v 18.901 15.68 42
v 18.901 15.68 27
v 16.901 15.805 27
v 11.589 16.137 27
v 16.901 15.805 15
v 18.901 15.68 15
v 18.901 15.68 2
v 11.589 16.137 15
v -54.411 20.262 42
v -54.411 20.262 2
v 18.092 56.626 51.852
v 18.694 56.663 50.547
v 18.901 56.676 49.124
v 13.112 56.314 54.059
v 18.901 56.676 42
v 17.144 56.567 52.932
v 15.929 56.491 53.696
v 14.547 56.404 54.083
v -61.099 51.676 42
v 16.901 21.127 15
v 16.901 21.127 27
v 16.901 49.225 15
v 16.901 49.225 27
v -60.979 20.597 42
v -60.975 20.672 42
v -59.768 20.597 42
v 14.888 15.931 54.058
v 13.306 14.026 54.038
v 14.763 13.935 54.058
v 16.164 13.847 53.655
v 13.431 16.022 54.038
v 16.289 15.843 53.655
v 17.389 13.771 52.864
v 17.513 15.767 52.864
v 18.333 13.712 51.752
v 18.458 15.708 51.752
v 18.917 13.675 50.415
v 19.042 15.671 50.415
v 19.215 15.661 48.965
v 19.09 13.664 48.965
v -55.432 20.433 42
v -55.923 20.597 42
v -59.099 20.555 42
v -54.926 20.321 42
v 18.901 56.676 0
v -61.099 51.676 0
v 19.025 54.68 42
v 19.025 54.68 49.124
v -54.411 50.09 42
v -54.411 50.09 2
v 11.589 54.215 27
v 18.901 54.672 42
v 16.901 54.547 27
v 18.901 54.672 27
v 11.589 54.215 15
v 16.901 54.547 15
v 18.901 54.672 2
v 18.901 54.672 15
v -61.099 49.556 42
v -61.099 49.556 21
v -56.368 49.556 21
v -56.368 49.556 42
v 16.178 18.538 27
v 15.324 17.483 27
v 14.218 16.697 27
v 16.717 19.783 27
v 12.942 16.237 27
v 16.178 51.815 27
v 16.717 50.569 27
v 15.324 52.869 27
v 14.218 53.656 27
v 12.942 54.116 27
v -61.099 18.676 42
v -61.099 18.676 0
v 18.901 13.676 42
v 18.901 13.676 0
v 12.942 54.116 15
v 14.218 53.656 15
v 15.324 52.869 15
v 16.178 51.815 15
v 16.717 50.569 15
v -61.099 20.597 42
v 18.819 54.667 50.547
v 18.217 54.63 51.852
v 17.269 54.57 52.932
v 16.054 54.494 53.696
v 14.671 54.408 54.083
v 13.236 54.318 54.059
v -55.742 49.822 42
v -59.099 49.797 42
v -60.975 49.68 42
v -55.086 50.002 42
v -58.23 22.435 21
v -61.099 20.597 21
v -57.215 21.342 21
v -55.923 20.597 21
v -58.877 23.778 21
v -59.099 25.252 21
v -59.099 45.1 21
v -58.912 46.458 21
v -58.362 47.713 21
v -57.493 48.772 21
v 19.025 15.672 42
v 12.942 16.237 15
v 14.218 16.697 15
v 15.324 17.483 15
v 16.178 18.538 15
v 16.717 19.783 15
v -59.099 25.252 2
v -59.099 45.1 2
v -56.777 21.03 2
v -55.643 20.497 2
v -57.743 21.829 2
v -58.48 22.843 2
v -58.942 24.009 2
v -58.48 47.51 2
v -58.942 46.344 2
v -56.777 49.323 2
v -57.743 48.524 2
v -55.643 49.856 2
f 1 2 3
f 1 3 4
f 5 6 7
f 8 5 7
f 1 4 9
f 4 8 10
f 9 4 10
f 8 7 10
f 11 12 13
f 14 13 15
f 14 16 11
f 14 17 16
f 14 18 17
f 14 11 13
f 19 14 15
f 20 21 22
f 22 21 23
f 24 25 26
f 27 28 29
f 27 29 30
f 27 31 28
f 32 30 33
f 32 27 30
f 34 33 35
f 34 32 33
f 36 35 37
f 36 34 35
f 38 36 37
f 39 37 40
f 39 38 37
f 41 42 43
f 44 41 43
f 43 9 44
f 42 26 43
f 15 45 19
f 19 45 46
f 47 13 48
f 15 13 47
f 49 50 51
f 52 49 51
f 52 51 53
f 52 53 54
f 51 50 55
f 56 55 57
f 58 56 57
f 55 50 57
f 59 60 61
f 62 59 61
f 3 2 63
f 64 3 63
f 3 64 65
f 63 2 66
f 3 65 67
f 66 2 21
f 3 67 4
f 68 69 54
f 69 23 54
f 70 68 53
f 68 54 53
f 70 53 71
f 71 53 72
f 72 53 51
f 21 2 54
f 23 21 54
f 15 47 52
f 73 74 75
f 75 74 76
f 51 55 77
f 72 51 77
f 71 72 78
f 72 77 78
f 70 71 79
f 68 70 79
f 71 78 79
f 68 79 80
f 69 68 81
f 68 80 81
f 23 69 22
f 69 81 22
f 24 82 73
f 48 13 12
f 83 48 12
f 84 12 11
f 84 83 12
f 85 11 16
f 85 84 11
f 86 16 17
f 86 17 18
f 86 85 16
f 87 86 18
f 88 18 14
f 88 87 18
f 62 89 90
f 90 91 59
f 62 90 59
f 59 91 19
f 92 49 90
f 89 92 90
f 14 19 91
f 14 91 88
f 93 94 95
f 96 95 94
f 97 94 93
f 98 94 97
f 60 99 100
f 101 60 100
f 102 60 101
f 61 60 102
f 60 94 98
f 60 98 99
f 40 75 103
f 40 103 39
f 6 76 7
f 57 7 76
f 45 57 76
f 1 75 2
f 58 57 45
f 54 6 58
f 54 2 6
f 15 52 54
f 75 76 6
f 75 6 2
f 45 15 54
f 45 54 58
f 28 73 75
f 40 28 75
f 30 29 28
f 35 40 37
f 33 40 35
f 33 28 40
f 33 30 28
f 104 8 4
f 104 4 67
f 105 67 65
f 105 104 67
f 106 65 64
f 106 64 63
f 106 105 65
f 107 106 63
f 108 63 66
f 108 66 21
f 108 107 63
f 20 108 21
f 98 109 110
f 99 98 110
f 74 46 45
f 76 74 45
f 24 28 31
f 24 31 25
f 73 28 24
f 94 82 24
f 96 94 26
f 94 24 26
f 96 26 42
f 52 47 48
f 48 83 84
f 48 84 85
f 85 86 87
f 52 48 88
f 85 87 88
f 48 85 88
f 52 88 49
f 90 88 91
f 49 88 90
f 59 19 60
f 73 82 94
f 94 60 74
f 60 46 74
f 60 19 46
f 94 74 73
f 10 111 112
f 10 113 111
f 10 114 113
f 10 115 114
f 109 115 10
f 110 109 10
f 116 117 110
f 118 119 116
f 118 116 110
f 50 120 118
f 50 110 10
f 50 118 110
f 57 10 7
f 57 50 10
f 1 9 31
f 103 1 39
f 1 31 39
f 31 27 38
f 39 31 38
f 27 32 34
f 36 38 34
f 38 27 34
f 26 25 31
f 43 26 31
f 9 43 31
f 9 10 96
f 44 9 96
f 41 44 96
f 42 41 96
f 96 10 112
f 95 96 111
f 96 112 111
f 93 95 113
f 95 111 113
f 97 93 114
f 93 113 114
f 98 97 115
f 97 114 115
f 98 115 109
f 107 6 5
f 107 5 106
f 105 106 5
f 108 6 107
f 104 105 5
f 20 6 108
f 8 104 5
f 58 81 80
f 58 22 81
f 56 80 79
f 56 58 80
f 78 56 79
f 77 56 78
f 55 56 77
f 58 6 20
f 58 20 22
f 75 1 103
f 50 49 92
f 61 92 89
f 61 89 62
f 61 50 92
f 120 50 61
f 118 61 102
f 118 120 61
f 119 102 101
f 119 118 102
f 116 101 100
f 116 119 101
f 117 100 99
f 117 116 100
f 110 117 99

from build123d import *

# Parameters (mm, degrees)
F1_DEPTH      = 2
F2_DEPTH      = 42
F5_DEPTH      = 2
F7_DEPTH      = 2
F8_W          = 28.9586056024
F8_H          = 21
F9_DEPTH      = 25
F10_W         = 38.9921951145
F10_H         = 12
F11_DEPTH     = 2
F12_T1_DEPTH  = 12
F12_T6_DEPTH  = 51.7431402671
F12_T11_DEPTH = 51.7431402671
F12_T17_DEPTH = 40
F12_T22_DEPTH = 51.7431402671
F13_R         = 5


# Not quite as in the source:
# - a fillet or chamfer that OpenCascade refuses, or shapes differently, is made with other operations: its cross-section is extruded or revolved along the edge and cut away or added


with BuildPart() as f1:
    # F0 (on Top) → F1 (new body)
    with BuildSketch(Plane.XY):
        Polygon((16.9007111498, 56.5512960928), (-61.0992888502, 51.6762960928), (-61.0992888502, 18.6762960928), (16.9007111498, 13.8012960928), (18.9007111498, 13.6762960928), (18.9007111498, 15.6801985355), (16.9007111498, 15.8051985355), (-59.0992888502, 20.5551985355), (-59.0992888502, 49.79739365), (16.9007111498, 54.54739365), (18.9007111498, 54.67239365), (18.9007111498, 56.6762960928), align=None)
        Polygon((18.9007111498, 15.6801985355), (18.9007111498, 54.67239365), (16.9007111498, 54.54739365), (16.9007111498, 15.8051985355), align=None)
        Polygon((16.9007111498, 15.8051985355), (16.9007111498, 54.54739365), (-59.0992888502, 49.79739365), (-59.0992888502, 20.5551985355), align=None)
    extrude(amount=F1_DEPTH)

    # F0 (on Top) → F2 (join)
    with BuildSketch(Plane.XY):
        Polygon((16.9007111498, 56.5512960928), (-61.0992888502, 51.6762960928), (-61.0992888502, 18.6762960928), (16.9007111498, 13.8012960928), (18.9007111498, 13.6762960928), (18.9007111498, 15.6801985355), (16.9007111498, 15.8051985355), (-59.0992888502, 20.5551985355), (-59.0992888502, 49.79739365), (16.9007111498, 54.54739365), (18.9007111498, 54.67239365), (18.9007111498, 56.6762960928), align=None)
    extrude(amount=F2_DEPTH)

    # F3 (on face) → F5 (join)
    with BuildSketch(Plane(origin=(0.9249861815, 14.7997789033, 0), x_dir=(0.9980525785, -0.0623782862, 0), z_dir=(-0.0623782862, -0.9980525785, 0))):
        Polygon((18.3653086424, 55), (-62.1452981224, 42), (18.010799587, 42), align=None)
    extrude(amount=-F5_DEPTH)

    # F6 (on face) → F7 (join)
    with BuildSketch(Plane(origin=(-3.4549417367, 55.2790677874, 0), x_dir=(-0.9980525785, -0.0623782862, 0), z_dir=(-0.0623782862, 0.9980525785, 0))):
        Polygon((-22.3992737141, 55), (-22.3992737141, 42), (57.7568239953, 42), align=None)
    extrude(amount=-F7_DEPTH)

    # F8 (on face) → F9 (cut)
    with BuildSketch(Plane(origin=(-61.0992888502, 0, 0), x_dir=(0, -1, 0), z_dir=(-1, 0, 0))):
        with Locations((-35.0762708113, 31.5)):
            Rectangle(F8_W, F8_H)
    extrude(amount=-F9_DEPTH, mode=Mode.SUBTRACT)

    # F10 (on face) → F11 (join)
    with BuildSketch(Plane.YZ.offset(18.9007111498)):
        with Locations((35.1762960928, 21)):
            Rectangle(F10_W, F10_H)
    extrude(amount=-F11_DEPTH)

    # F12: fillet of radius 5 on 4 edges, made by hand

    # F12_s2 → F12_t1 (join)
    with BuildSketch(Plane.XY.offset(15)):
        with BuildLine():
            ThreePointArc((11.588819719, 16.1371917499), (15.324199345, 17.4833184516), (16.9007111498, 21.1274546423))
            Line((16.9007111498, 21.1274546423), (16.9007111498, 15.8051985355))
            Line((16.9007111498, 15.8051985355), (11.588819719, 16.1371917499))
        make_face()
        with BuildLine():
            ThreePointArc((11.588819719, 54.2154004356), (15.324199345, 52.869273734), (16.9007111498, 49.2251375432))
            Line((16.9007111498, 49.2251375432), (16.9007111498, 54.54739365))
            Line((16.9007111498, 54.54739365), (11.588819719, 54.2154004356))
        make_face()
    extrude(amount=F12_T1_DEPTH)


with BuildPart() as f12_tool4:
    # F12_s5 → F12_t6 (new body)
    with BuildSketch(Plane.XY.offset(2)):
        with BuildLine():
            ThreePointArc((-54.411180281, 20.2621917499), (-57.743425041, 21.8289664471), (-59.0992888502, 25.2524546423))
            Line((-59.0992888502, 25.2524546423), (-59.0992888502, 20.5551985355))
            Line((-59.0992888502, 20.5551985355), (-54.411180281, 20.2621917499))
        make_face()
    extrude(amount=F12_T6_DEPTH)

    split(bisect_by=Plane.XY.offset(21), keep=Keep.BOTTOM)


with BuildPart() as f1_1:
    add(f1.part)

    # F12_t3: union F12_tool4
    add(f12_tool4.part)


with BuildPart() as f12_tool9:
    # F12_s10 → F12_t11 (new body)
    with BuildSketch(Plane.XY.offset(-9.7431402671)):
        with BuildLine():
            ThreePointArc((-54.411180281, 20.2621917499), (-57.743425041, 21.8289664471), (-59.0992888502, 25.2524546423))
            Line((-59.0992888502, 25.2524546423), (-59.0992888502, 20.5551985355))
            Line((-59.0992888502, 20.5551985355), (-54.411180281, 20.2621917499))
        make_face()
    extrude(amount=F12_T11_DEPTH)

    split(bisect_by=Plane.XZ.offset(-20.5969680101), keep=Keep.TOP)

    split(bisect_by=Plane.XY.offset(21), keep=Keep.TOP)


with BuildPart() as f1_2:
    add(f1_1.part)

    # F12_t8: union F12_tool9
    add(f12_tool9.part)


with BuildPart() as f12_tool15:
    # F12_s16 → F12_t17 (new body)
    with BuildSketch(Plane.XY.offset(2)):
        with BuildLine():
            ThreePointArc((-54.411180281, 50.0904004356), (-57.743425041, 48.5236257384), (-59.0992888502, 45.1001375432))
            Line((-59.0992888502, 45.1001375432), (-59.0992888502, 49.79739365))
            Line((-59.0992888502, 49.79739365), (-54.411180281, 50.0904004356))
        make_face()
    extrude(amount=F12_T17_DEPTH)

    split(bisect_by=Plane.XZ.offset(-49.5555736125), keep=Keep.BOTTOM)


with BuildPart() as f1_3:
    add(f1_2.part)

    # F12_t14: union F12_tool15
    add(f12_tool15.part)


with BuildPart() as f12_tool20:
    # F12_s21 → F12_t22 (new body)
    with BuildSketch(Plane.XY.offset(2)):
        with BuildLine():
            ThreePointArc((-54.411180281, 50.0904004356), (-57.743425041, 48.5236257384), (-59.0992888502, 45.1001375432))
            Line((-59.0992888502, 45.1001375432), (-59.0992888502, 49.79739365))
            Line((-59.0992888502, 49.79739365), (-54.411180281, 50.0904004356))
        make_face()
    extrude(amount=F12_T22_DEPTH)

    split(bisect_by=Plane.XY.offset(21), keep=Keep.BOTTOM)


with BuildPart() as f1_4:
    add(f1_3.part)

    # F12_t19: union F12_tool20
    add(f12_tool20.part)

    # F13
    f13_edges = [f1_4.edges().sort_by_distance(p)[0] for p in [
        (18.963089, 55.678244, 55),
        (19.316908, 14.652235, 55),
    ]]
    fillet(f13_edges, radius=F13_R)


solid = f1_4.part
